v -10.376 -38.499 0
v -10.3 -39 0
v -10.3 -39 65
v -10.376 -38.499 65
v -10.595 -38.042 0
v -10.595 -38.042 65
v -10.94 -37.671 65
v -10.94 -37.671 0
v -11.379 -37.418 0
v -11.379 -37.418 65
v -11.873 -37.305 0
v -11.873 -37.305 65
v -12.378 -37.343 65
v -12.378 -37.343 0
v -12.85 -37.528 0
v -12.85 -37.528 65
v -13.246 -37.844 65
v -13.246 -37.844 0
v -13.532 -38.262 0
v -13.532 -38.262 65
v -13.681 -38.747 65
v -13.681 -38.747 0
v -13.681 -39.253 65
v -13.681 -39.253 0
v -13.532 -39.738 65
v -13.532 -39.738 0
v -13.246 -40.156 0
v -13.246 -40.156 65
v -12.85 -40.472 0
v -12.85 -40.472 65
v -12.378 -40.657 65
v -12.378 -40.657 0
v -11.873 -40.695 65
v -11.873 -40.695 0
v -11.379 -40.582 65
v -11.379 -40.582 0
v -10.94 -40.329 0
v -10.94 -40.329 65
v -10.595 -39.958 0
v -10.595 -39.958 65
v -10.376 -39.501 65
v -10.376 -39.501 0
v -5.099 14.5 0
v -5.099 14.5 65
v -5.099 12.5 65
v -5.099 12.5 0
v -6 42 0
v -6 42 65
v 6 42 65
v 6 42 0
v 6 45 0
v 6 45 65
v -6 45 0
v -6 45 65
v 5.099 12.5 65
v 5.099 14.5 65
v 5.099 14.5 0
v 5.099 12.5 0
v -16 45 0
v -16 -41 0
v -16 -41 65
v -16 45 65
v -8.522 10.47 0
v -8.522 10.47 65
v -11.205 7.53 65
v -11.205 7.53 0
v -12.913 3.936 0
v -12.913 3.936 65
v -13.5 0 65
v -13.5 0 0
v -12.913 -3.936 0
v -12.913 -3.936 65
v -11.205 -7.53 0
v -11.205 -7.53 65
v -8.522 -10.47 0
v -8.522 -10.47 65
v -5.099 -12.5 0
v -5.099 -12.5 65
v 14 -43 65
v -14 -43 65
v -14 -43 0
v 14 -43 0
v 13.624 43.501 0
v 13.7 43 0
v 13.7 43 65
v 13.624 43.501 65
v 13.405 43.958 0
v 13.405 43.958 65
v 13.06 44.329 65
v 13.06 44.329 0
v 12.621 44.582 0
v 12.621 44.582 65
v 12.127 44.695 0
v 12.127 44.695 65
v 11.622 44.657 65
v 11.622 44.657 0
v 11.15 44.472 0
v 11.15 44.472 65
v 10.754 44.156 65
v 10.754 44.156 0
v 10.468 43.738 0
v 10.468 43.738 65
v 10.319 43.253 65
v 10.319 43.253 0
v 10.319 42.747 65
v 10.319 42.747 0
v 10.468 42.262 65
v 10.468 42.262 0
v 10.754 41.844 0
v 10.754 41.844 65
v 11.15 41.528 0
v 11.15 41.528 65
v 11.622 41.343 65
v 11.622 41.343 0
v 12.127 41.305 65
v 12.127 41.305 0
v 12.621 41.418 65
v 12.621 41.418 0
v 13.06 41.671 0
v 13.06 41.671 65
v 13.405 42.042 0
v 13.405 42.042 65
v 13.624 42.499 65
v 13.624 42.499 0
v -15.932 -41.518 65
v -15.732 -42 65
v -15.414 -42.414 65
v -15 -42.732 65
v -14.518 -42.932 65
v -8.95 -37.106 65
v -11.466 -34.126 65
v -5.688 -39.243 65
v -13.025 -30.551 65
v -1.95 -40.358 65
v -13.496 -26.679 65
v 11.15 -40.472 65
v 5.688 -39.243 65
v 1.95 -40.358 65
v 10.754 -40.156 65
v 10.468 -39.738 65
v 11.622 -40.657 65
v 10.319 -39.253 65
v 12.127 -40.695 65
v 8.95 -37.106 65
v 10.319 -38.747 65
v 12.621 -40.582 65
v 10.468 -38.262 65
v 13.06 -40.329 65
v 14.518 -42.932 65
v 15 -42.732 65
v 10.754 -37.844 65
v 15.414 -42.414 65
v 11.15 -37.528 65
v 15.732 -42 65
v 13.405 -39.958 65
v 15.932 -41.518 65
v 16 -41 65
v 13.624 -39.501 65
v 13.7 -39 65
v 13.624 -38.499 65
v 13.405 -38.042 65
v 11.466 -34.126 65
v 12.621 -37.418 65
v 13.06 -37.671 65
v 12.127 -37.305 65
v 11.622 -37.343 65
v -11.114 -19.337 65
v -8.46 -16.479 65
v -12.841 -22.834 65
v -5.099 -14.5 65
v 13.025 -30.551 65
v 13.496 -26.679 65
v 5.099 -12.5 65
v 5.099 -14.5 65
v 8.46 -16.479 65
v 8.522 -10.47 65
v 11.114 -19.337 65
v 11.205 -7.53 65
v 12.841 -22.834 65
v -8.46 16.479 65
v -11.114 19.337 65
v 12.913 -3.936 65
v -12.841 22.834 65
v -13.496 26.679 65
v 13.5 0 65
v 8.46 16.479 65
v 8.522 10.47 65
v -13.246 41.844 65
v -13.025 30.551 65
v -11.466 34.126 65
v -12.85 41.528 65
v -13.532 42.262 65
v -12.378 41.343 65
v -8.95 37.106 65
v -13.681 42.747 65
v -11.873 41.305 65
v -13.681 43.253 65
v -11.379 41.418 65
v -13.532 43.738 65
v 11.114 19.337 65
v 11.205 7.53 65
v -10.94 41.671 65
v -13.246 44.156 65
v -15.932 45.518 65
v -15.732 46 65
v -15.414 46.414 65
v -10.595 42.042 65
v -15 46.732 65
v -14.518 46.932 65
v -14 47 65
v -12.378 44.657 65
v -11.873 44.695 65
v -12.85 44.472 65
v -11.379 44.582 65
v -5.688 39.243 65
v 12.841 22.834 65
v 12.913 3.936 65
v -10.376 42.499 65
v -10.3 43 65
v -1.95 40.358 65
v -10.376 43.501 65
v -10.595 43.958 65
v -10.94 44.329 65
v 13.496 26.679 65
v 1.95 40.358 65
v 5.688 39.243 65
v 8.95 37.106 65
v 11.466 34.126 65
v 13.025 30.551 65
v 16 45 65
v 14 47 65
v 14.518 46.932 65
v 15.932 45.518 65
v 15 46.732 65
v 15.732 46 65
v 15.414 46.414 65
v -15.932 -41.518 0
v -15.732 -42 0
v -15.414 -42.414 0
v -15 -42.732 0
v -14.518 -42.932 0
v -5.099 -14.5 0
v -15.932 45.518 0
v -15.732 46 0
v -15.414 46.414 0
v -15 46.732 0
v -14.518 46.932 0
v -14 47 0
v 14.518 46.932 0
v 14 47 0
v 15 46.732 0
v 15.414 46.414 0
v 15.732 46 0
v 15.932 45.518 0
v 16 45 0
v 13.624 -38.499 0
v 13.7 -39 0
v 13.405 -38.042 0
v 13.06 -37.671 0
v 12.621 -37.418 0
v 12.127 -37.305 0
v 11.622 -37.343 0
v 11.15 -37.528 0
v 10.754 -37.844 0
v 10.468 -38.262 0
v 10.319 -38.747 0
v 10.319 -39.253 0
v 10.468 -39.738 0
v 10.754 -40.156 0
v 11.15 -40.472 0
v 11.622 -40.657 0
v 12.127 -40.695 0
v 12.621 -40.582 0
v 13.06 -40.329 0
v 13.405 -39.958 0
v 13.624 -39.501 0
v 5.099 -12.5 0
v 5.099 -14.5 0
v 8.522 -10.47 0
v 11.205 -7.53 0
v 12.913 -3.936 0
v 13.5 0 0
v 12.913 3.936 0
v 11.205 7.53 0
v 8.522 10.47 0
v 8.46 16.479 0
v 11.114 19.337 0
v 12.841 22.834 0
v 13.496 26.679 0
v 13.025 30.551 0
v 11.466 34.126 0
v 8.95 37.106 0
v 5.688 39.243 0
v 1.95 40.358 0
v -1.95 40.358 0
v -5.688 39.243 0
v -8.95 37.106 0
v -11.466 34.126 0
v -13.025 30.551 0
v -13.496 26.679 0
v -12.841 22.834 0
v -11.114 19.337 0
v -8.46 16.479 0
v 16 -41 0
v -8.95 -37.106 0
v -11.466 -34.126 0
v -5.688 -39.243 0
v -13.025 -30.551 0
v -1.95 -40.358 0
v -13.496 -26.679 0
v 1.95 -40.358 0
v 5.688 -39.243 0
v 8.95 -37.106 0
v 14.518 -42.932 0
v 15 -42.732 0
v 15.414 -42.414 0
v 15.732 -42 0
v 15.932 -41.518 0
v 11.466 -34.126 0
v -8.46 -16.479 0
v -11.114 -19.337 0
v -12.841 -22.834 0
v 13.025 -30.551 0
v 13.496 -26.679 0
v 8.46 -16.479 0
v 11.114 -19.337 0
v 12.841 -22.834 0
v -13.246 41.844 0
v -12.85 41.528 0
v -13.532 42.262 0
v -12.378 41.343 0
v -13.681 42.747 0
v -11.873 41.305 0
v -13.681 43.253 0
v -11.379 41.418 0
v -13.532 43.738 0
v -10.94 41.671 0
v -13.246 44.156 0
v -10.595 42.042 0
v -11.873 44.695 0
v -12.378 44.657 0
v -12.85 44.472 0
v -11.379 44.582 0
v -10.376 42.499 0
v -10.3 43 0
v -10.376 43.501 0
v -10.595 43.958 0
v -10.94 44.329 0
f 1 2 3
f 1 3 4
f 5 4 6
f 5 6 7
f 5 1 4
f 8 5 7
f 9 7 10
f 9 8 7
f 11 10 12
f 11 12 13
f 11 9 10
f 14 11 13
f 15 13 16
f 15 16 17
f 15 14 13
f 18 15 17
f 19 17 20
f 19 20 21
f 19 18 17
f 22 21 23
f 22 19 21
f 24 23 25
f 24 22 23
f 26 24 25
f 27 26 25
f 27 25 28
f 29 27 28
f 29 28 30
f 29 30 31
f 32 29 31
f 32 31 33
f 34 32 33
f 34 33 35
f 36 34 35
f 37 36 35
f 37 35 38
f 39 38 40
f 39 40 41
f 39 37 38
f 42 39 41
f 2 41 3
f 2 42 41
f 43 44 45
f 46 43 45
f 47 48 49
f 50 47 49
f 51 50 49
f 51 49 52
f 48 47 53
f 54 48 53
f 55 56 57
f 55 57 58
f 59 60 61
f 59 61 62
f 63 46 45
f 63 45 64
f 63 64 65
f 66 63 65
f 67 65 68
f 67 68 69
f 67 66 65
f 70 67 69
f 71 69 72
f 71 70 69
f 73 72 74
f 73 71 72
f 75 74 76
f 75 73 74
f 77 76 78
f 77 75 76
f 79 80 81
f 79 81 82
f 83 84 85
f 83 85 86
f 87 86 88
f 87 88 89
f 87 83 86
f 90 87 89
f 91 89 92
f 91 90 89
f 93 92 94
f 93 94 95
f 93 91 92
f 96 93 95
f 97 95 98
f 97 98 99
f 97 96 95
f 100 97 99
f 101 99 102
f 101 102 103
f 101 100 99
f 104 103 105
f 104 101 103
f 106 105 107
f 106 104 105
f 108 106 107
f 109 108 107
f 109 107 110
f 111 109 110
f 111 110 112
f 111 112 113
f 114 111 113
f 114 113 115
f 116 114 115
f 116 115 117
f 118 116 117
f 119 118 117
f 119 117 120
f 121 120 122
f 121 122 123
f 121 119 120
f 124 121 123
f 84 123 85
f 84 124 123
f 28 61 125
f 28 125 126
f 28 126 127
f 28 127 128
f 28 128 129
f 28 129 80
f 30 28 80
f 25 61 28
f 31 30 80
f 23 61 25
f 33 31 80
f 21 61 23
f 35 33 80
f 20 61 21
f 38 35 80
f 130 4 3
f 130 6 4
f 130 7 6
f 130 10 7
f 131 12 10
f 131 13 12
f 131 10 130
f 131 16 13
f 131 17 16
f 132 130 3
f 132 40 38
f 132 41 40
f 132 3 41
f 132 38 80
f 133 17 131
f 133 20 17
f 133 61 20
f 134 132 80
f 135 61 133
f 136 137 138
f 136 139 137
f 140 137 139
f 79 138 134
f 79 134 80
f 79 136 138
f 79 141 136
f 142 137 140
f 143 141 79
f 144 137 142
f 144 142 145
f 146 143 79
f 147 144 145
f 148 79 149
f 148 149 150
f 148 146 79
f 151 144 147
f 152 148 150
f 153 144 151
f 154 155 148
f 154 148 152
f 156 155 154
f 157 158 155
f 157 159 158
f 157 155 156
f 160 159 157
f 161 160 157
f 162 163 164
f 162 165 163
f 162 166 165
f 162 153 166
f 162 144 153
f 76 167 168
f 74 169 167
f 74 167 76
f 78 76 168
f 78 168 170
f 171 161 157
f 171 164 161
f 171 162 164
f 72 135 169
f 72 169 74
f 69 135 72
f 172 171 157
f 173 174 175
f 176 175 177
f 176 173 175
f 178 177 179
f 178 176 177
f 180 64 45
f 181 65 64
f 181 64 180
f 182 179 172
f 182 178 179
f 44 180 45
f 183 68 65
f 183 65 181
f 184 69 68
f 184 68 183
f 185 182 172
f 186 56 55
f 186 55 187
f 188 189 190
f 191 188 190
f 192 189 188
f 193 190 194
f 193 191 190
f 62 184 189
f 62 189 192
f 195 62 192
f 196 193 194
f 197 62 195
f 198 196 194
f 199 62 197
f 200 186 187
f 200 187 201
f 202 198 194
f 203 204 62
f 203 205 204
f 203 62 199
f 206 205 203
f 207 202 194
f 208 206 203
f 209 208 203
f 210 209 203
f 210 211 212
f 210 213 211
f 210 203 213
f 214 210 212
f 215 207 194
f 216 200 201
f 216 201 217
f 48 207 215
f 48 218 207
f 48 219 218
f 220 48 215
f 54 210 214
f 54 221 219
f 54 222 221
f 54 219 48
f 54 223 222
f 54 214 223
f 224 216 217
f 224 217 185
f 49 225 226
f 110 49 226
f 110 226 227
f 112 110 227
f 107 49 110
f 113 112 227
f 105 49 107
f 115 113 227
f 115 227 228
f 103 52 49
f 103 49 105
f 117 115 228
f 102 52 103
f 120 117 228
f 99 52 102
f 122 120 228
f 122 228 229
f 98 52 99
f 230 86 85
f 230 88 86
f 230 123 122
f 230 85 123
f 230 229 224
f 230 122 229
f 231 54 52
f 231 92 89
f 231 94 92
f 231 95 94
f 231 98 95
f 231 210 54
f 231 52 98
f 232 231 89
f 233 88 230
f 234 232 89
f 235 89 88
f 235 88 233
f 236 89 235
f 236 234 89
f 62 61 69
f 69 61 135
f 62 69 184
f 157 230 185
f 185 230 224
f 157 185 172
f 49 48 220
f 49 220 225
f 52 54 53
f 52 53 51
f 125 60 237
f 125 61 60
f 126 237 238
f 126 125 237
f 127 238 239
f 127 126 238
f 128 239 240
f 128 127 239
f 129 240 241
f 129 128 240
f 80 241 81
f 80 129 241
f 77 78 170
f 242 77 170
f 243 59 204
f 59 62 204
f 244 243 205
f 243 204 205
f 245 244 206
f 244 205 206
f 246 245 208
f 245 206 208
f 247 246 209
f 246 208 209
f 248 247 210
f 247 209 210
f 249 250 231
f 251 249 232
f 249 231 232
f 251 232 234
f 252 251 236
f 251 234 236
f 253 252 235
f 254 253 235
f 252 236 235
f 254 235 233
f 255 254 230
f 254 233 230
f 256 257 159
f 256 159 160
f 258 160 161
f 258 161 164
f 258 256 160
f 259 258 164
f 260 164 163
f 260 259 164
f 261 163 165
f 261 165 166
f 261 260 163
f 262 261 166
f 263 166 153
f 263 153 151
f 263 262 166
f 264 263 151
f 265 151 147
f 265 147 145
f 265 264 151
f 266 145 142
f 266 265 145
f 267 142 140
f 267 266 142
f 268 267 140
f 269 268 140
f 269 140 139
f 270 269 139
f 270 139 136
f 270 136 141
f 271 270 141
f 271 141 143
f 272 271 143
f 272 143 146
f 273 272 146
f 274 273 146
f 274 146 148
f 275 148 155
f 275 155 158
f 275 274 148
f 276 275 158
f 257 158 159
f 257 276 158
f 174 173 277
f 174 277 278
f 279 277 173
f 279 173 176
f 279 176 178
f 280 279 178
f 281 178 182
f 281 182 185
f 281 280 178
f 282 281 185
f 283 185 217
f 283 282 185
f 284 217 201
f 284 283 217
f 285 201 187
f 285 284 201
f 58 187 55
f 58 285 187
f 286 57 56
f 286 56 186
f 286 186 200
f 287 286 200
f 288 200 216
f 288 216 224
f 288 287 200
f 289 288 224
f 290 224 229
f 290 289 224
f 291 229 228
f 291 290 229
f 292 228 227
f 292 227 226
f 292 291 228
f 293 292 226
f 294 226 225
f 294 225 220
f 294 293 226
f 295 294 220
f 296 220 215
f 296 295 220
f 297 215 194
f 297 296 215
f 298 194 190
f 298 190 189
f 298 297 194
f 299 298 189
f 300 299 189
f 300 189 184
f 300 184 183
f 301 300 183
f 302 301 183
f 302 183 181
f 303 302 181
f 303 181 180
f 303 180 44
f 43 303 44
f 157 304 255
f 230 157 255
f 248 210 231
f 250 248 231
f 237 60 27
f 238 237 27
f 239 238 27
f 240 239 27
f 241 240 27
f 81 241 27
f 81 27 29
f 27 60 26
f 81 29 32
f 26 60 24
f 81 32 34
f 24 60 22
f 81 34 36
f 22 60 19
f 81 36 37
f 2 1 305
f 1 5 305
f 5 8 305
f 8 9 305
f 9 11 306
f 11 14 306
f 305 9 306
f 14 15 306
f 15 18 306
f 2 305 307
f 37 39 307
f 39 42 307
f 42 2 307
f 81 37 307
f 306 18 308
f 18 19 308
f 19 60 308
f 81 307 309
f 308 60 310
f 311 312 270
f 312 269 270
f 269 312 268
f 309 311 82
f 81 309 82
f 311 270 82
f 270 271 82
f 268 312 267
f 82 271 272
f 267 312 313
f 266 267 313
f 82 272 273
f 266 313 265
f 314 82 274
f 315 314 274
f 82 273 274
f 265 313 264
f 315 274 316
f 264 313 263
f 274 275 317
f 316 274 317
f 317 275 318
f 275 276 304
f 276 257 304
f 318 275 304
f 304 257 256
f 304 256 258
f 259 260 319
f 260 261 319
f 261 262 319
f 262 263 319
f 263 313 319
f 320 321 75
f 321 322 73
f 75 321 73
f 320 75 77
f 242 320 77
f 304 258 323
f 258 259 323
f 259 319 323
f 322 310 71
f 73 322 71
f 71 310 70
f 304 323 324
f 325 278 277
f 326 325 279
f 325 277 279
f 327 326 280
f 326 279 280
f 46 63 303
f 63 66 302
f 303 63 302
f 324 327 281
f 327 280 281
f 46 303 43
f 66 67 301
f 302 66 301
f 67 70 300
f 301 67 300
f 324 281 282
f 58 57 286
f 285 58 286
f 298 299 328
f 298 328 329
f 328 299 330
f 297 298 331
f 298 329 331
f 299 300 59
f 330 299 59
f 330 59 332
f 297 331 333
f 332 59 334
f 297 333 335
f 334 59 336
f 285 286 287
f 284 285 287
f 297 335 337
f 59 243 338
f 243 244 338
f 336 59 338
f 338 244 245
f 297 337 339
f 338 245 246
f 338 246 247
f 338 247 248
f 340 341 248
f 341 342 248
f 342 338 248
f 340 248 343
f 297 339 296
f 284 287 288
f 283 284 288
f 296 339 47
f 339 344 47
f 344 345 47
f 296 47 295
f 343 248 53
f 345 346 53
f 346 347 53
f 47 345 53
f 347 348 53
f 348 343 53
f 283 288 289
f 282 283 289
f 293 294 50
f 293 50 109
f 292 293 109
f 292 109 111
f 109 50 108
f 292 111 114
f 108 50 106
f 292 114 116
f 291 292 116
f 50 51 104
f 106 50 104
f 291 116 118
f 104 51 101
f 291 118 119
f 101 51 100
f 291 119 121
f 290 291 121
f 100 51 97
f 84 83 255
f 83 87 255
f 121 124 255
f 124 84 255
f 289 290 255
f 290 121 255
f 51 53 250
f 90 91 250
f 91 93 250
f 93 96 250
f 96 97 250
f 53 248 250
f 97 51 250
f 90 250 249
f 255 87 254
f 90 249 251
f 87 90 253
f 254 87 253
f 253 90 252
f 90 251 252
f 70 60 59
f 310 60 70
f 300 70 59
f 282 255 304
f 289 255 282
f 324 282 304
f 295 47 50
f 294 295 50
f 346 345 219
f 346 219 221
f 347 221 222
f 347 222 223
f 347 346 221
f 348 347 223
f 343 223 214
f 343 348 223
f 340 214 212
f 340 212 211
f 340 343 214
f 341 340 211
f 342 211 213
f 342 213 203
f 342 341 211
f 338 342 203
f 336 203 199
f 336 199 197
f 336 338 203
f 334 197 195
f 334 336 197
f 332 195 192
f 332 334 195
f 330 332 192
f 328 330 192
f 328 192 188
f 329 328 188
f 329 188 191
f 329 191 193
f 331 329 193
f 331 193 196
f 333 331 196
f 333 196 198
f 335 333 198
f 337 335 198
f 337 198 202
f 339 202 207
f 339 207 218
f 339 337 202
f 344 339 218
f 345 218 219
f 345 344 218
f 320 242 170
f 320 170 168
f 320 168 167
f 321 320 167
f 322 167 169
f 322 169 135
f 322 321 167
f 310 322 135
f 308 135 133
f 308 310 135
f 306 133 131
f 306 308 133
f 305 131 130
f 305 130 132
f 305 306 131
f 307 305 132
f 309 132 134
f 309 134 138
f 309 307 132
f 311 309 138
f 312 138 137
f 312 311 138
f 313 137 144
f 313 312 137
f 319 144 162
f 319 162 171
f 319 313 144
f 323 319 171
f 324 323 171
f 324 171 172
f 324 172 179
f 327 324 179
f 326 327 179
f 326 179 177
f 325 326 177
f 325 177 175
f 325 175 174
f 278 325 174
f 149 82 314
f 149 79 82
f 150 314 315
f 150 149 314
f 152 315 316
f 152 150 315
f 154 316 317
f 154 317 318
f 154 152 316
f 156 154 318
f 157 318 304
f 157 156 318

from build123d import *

# Parameters (mm, degrees)
SKETCH_W      = 32
SKETCH_H      = 90
SKETCH_R      = 1.7
SKETCH_W_2    = 12
SKETCH_H_2    = 3
EXTRUDE_DEPTH = 65
FILLET_R      = 2


with BuildPart() as part:
    # Sketch → Extrude (new body)
    with BuildSketch(Plane.XY):
        with Locations((0, 2)):
            Rectangle(SKETCH_W, SKETCH_H)
        with Locations((12, 43)):
            Circle(SKETCH_R, mode=Mode.SUBTRACT)
        with Locations((-12, 43)):
            Circle(SKETCH_R, mode=Mode.SUBTRACT)
        with Locations((-12, -39)):
            Circle(SKETCH_R, mode=Mode.SUBTRACT)
        with Locations((12, -39)):
            Circle(SKETCH_R, mode=Mode.SUBTRACT)
        with BuildLine():
            ThreePointArc((5.09902, 14.5), (0, 40.5), (-5.09902, 14.5))
            Line((-5.09902, 14.5), (-5.09902, 12.5))
            ThreePointArc((-5.09902, 12.5), (-13.5, 0), (-5.09902, -12.5))
            Line((-5.09902, -12.5), (-5.09902, -14.5))
            ThreePointArc((-5.09902, -14.5), (0, -40.5), (5.09902, -14.5))
            Line((5.09902, -12.5), (5.09902, -14.5))
            ThreePointArc((5.09902, -12.5), (13.5, 0), (5.09902, 12.5))
            Line((5.09902, 14.5), (5.09902, 12.5))
        make_face(mode=Mode.SUBTRACT)
        with Locations((0, 43.5)):
            Rectangle(SKETCH_W_2, SKETCH_H_2, mode=Mode.SUBTRACT)
    extrude(amount=EXTRUDE_DEPTH)

    # Fillet
    fillet_edges = [part.edges().sort_by_distance(p)[0] for p in [
        (-16, 47, 32.5),
        (16, 47, 32.5),
        (16, -43, 32.5),
        (-16, -43, 32.5),
    ]]
    fillet(fillet_edges, radius=FILLET_R)


solid = part.part
